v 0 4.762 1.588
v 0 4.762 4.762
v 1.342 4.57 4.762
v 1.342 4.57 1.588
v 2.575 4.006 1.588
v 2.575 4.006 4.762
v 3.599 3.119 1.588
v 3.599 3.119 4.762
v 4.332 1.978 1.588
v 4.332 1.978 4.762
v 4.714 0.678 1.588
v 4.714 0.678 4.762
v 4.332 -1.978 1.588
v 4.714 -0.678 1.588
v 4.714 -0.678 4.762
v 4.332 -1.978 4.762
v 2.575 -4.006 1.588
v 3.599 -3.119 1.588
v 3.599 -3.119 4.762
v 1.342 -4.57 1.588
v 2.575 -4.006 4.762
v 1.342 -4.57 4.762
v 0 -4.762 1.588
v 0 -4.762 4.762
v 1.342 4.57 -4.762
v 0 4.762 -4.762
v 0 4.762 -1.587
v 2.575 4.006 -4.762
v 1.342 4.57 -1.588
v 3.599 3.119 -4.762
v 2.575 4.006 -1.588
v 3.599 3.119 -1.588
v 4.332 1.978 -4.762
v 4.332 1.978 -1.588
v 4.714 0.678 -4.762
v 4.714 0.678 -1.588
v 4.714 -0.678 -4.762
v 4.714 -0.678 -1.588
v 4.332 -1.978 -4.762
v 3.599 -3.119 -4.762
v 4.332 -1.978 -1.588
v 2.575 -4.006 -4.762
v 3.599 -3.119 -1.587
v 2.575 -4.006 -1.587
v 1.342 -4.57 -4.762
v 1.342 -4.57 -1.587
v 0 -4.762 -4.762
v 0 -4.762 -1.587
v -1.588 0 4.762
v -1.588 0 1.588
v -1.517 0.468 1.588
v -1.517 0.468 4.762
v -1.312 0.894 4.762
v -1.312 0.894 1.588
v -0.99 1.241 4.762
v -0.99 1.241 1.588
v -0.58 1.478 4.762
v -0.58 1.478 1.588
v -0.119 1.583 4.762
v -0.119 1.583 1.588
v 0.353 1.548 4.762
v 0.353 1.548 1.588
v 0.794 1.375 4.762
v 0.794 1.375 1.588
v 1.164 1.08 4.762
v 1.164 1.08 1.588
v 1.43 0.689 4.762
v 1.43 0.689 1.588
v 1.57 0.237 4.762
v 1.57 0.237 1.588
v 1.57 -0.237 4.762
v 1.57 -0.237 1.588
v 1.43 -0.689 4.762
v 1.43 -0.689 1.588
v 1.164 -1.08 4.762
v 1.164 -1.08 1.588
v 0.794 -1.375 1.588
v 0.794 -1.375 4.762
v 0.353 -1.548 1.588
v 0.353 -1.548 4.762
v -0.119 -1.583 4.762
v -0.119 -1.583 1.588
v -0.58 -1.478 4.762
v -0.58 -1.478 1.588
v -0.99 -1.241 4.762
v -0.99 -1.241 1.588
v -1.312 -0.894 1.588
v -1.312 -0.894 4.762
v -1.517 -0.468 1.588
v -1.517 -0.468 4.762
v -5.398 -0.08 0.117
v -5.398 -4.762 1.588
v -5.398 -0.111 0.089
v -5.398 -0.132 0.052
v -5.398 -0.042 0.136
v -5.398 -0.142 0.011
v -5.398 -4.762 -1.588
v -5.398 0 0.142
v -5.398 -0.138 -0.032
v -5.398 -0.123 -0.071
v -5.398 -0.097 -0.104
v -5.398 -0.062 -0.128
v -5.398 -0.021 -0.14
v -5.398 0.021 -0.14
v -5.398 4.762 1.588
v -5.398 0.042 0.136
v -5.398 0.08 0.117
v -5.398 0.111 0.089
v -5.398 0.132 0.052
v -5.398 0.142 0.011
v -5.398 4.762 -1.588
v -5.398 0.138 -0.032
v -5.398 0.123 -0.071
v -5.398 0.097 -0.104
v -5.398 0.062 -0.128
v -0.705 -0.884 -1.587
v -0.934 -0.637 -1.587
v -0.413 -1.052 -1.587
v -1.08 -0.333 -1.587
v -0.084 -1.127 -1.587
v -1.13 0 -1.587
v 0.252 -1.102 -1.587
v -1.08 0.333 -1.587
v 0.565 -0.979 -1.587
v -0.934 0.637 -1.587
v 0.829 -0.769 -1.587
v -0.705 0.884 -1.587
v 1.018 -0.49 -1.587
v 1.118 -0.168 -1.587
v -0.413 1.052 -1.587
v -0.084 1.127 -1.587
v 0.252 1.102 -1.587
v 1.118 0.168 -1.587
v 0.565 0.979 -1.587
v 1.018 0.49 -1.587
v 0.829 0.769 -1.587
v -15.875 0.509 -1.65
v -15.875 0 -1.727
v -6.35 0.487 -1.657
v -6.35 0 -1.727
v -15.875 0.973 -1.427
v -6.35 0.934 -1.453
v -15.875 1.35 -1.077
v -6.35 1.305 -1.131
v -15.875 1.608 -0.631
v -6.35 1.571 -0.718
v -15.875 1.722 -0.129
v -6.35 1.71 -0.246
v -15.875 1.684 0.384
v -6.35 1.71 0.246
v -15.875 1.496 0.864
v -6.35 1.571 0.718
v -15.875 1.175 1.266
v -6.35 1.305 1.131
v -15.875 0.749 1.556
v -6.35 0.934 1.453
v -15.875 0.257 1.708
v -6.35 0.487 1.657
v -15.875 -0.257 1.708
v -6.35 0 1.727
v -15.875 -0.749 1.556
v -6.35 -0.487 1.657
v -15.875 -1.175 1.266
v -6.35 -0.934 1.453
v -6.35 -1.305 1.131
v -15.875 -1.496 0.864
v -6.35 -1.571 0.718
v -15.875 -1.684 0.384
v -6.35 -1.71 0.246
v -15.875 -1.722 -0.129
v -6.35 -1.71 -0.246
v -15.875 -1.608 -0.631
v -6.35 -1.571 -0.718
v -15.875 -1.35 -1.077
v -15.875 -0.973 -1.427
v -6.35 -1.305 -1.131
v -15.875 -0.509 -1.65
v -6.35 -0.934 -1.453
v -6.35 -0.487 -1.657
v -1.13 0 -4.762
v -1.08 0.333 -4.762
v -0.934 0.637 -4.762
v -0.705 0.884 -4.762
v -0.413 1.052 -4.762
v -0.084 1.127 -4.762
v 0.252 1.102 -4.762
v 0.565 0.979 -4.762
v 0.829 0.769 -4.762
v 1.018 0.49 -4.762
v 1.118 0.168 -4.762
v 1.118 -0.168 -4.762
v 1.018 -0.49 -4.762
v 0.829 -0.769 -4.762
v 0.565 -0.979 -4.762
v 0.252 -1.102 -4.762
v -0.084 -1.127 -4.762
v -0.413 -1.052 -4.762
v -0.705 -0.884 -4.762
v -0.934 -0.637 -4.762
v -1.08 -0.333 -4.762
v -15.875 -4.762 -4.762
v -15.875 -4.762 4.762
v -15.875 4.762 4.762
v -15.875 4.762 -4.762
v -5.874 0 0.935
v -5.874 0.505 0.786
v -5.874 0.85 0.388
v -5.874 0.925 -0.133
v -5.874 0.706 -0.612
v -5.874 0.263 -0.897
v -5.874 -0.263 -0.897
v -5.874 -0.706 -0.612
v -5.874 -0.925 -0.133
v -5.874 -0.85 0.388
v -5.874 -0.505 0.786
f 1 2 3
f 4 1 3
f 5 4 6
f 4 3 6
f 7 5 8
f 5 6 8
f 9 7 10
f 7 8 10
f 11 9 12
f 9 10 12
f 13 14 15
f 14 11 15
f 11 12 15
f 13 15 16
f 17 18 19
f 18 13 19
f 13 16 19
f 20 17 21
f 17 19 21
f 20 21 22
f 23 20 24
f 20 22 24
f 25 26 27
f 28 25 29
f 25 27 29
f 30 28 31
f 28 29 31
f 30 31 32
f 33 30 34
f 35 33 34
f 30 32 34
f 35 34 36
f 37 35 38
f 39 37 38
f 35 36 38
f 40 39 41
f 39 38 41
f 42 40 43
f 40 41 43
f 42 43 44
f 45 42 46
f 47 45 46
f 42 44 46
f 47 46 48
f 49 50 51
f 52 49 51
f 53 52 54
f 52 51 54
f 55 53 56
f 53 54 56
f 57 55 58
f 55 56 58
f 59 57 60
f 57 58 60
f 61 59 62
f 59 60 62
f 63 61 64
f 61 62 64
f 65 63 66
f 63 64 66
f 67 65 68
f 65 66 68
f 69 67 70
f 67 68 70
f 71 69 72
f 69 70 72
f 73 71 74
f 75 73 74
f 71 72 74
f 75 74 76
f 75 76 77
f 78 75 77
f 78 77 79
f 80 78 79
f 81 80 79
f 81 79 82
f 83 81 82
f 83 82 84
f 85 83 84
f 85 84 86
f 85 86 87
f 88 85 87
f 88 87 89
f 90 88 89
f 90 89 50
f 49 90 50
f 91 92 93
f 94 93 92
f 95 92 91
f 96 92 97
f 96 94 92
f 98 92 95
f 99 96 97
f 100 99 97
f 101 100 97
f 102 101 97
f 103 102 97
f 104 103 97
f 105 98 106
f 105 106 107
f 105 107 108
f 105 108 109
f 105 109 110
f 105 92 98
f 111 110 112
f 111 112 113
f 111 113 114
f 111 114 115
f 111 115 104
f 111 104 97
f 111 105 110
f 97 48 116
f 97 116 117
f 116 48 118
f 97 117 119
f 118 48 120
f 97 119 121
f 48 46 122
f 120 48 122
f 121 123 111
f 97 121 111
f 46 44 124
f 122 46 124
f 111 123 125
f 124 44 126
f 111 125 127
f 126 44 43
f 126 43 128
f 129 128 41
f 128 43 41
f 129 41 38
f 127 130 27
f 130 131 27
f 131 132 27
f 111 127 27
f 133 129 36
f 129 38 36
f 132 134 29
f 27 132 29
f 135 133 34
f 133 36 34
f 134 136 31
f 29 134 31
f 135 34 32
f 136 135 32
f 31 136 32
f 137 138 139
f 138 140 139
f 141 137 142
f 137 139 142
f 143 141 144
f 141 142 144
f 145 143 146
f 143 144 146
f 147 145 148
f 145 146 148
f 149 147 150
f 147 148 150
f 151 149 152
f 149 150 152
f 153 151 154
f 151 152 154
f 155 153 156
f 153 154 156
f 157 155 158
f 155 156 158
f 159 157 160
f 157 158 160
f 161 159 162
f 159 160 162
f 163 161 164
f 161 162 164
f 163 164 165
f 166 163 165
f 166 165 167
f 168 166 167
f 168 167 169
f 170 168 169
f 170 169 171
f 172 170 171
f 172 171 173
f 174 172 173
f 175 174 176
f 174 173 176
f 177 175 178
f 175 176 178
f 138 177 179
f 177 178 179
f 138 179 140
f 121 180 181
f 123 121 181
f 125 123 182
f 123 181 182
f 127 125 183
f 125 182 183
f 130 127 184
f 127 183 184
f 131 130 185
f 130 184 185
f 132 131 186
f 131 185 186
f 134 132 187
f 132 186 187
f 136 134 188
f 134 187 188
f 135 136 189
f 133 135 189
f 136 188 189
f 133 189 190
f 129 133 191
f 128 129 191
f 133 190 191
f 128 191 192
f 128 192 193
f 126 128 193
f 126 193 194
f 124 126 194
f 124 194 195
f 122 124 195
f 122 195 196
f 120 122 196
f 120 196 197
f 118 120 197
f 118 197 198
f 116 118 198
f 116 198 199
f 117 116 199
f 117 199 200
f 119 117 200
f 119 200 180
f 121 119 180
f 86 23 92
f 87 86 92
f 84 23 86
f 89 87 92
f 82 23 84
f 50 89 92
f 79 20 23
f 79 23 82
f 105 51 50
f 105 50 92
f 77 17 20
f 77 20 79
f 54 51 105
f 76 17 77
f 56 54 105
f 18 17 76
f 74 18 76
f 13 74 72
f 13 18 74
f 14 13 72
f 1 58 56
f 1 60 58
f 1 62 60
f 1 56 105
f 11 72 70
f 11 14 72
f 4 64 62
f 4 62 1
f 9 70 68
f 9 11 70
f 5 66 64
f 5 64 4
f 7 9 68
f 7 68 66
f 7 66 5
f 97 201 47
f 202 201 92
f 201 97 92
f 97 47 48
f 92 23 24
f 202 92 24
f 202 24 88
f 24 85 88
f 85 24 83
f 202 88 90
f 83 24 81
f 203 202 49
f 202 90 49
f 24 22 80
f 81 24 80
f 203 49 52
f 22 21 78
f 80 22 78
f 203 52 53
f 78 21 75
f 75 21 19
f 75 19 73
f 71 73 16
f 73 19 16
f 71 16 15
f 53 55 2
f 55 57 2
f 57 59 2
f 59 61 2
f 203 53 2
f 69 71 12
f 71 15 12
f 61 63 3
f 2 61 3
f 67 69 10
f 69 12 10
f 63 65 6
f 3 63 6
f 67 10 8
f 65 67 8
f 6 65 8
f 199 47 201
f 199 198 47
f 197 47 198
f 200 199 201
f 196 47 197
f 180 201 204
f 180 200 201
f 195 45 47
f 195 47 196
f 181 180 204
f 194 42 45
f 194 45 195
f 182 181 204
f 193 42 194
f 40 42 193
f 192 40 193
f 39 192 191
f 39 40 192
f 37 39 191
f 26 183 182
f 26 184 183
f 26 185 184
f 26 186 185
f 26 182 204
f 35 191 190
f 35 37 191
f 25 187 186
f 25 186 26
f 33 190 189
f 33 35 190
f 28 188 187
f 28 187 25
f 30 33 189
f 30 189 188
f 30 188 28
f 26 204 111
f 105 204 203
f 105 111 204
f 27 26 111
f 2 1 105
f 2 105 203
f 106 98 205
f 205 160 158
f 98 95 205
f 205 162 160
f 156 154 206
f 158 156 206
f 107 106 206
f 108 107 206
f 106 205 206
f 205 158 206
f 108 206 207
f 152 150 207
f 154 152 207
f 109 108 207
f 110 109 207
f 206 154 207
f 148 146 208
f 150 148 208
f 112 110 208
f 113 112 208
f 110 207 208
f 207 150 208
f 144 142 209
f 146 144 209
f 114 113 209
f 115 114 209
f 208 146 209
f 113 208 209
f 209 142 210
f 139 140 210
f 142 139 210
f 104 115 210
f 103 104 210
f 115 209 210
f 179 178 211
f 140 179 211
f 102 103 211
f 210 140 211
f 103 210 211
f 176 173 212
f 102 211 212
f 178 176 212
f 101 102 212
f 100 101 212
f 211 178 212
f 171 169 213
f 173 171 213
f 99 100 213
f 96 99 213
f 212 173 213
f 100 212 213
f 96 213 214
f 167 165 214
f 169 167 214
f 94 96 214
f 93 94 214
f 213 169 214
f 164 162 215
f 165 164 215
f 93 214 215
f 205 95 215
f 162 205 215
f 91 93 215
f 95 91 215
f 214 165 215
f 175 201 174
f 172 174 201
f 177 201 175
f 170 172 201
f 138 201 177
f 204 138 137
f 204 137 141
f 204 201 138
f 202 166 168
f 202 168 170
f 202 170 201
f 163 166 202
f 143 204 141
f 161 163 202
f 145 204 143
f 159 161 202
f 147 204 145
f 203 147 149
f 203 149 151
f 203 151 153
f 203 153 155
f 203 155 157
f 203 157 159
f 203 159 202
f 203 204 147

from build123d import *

# Parameters (mm, degrees)
BOSS_EXTRUDE2_DEPTH              = 4.7625
SKETCH3_W                        = 3.175
SKETCH3_H                        = 9.525
CUT_EXTRUDE1_DEPTH               = 10.16
SKETCH4_W                        = 9.525
SKETCH4_H                        = 9.525
BOSS_EXTRUDE3_DEPTH              = 6.35
F_8_32_TAPPED_HOLE1_D            = 3.4544
F_8_32_TAPPED_HOLE1_DEPTH        = 9.525
F_8_32_TAPPED_HOLE1_TIP          = 1.037806461
F_1_8_0_125_DIAMETER_HOLE1_D     = 3.175
F_1_8_0_125_DIAMETER_HOLE1_DEPTH = 3.175
F_4_40_TAPPED_HOLE1_D            = 2.2606


with BuildPart() as part:
    # Sketch2 → Boss-Extrude2 (new body, symmetric)
    with BuildSketch(Plane.XY):
        with BuildLine():
            Line((-9.525, 4.7625), (0, 4.7625))
            ThreePointArc((0, 4.7625), (4.7625, 0), (0, -4.7625))
            Line((0, -4.7625), (-9.525, -4.7625))
            Line((-9.525, -4.7625), (-9.525, 4.7625))
        make_face()
    extrude(amount=BOSS_EXTRUDE2_DEPTH, both=True)

    # Sketch3 → Cut-Extrude1 (cut)
    with BuildSketch(Plane(origin=(4.7625, 0, 0), x_dir=(0, 0, -1), z_dir=(1, 0, 0))):
        Rectangle(SKETCH3_W, SKETCH3_H)
    extrude(amount=-CUT_EXTRUDE1_DEPTH, mode=Mode.SUBTRACT)

    # Sketch4 → Boss-Extrude3 (add)
    with BuildSketch(Plane.ZY.offset(9.525)):
        Rectangle(SKETCH4_W, SKETCH4_H)
    extrude(amount=BOSS_EXTRUDE3_DEPTH)

    # #8-32 Tapped Hole1
    with Locations(Plane.ZY.offset(15.875)):
        with Locations((0, 0)):
            Hole(F_8_32_TAPPED_HOLE1_D / 2, depth=F_8_32_TAPPED_HOLE1_DEPTH)
            with Locations((0, 0, -(F_8_32_TAPPED_HOLE1_DEPTH + F_8_32_TAPPED_HOLE1_TIP / 2))):  # 118° drill point
                Cone(0, F_8_32_TAPPED_HOLE1_D / 2, F_8_32_TAPPED_HOLE1_TIP, mode=Mode.SUBTRACT)

    # 1/8 (0.125) Diameter Hole1
    with Locations(Plane.XY.offset(4.7625)):
        with Locations((0, 0)):
            Hole(F_1_8_0_125_DIAMETER_HOLE1_D / 2, depth=F_1_8_0_125_DIAMETER_HOLE1_DEPTH)

    # #4-40 Tapped Hole1 (through all)
    with Locations(Plane.XY.offset(-1.5875)):
        with Locations((0, 0)):
            Hole(F_4_40_TAPPED_HOLE1_D / 2)


solid = part.part
